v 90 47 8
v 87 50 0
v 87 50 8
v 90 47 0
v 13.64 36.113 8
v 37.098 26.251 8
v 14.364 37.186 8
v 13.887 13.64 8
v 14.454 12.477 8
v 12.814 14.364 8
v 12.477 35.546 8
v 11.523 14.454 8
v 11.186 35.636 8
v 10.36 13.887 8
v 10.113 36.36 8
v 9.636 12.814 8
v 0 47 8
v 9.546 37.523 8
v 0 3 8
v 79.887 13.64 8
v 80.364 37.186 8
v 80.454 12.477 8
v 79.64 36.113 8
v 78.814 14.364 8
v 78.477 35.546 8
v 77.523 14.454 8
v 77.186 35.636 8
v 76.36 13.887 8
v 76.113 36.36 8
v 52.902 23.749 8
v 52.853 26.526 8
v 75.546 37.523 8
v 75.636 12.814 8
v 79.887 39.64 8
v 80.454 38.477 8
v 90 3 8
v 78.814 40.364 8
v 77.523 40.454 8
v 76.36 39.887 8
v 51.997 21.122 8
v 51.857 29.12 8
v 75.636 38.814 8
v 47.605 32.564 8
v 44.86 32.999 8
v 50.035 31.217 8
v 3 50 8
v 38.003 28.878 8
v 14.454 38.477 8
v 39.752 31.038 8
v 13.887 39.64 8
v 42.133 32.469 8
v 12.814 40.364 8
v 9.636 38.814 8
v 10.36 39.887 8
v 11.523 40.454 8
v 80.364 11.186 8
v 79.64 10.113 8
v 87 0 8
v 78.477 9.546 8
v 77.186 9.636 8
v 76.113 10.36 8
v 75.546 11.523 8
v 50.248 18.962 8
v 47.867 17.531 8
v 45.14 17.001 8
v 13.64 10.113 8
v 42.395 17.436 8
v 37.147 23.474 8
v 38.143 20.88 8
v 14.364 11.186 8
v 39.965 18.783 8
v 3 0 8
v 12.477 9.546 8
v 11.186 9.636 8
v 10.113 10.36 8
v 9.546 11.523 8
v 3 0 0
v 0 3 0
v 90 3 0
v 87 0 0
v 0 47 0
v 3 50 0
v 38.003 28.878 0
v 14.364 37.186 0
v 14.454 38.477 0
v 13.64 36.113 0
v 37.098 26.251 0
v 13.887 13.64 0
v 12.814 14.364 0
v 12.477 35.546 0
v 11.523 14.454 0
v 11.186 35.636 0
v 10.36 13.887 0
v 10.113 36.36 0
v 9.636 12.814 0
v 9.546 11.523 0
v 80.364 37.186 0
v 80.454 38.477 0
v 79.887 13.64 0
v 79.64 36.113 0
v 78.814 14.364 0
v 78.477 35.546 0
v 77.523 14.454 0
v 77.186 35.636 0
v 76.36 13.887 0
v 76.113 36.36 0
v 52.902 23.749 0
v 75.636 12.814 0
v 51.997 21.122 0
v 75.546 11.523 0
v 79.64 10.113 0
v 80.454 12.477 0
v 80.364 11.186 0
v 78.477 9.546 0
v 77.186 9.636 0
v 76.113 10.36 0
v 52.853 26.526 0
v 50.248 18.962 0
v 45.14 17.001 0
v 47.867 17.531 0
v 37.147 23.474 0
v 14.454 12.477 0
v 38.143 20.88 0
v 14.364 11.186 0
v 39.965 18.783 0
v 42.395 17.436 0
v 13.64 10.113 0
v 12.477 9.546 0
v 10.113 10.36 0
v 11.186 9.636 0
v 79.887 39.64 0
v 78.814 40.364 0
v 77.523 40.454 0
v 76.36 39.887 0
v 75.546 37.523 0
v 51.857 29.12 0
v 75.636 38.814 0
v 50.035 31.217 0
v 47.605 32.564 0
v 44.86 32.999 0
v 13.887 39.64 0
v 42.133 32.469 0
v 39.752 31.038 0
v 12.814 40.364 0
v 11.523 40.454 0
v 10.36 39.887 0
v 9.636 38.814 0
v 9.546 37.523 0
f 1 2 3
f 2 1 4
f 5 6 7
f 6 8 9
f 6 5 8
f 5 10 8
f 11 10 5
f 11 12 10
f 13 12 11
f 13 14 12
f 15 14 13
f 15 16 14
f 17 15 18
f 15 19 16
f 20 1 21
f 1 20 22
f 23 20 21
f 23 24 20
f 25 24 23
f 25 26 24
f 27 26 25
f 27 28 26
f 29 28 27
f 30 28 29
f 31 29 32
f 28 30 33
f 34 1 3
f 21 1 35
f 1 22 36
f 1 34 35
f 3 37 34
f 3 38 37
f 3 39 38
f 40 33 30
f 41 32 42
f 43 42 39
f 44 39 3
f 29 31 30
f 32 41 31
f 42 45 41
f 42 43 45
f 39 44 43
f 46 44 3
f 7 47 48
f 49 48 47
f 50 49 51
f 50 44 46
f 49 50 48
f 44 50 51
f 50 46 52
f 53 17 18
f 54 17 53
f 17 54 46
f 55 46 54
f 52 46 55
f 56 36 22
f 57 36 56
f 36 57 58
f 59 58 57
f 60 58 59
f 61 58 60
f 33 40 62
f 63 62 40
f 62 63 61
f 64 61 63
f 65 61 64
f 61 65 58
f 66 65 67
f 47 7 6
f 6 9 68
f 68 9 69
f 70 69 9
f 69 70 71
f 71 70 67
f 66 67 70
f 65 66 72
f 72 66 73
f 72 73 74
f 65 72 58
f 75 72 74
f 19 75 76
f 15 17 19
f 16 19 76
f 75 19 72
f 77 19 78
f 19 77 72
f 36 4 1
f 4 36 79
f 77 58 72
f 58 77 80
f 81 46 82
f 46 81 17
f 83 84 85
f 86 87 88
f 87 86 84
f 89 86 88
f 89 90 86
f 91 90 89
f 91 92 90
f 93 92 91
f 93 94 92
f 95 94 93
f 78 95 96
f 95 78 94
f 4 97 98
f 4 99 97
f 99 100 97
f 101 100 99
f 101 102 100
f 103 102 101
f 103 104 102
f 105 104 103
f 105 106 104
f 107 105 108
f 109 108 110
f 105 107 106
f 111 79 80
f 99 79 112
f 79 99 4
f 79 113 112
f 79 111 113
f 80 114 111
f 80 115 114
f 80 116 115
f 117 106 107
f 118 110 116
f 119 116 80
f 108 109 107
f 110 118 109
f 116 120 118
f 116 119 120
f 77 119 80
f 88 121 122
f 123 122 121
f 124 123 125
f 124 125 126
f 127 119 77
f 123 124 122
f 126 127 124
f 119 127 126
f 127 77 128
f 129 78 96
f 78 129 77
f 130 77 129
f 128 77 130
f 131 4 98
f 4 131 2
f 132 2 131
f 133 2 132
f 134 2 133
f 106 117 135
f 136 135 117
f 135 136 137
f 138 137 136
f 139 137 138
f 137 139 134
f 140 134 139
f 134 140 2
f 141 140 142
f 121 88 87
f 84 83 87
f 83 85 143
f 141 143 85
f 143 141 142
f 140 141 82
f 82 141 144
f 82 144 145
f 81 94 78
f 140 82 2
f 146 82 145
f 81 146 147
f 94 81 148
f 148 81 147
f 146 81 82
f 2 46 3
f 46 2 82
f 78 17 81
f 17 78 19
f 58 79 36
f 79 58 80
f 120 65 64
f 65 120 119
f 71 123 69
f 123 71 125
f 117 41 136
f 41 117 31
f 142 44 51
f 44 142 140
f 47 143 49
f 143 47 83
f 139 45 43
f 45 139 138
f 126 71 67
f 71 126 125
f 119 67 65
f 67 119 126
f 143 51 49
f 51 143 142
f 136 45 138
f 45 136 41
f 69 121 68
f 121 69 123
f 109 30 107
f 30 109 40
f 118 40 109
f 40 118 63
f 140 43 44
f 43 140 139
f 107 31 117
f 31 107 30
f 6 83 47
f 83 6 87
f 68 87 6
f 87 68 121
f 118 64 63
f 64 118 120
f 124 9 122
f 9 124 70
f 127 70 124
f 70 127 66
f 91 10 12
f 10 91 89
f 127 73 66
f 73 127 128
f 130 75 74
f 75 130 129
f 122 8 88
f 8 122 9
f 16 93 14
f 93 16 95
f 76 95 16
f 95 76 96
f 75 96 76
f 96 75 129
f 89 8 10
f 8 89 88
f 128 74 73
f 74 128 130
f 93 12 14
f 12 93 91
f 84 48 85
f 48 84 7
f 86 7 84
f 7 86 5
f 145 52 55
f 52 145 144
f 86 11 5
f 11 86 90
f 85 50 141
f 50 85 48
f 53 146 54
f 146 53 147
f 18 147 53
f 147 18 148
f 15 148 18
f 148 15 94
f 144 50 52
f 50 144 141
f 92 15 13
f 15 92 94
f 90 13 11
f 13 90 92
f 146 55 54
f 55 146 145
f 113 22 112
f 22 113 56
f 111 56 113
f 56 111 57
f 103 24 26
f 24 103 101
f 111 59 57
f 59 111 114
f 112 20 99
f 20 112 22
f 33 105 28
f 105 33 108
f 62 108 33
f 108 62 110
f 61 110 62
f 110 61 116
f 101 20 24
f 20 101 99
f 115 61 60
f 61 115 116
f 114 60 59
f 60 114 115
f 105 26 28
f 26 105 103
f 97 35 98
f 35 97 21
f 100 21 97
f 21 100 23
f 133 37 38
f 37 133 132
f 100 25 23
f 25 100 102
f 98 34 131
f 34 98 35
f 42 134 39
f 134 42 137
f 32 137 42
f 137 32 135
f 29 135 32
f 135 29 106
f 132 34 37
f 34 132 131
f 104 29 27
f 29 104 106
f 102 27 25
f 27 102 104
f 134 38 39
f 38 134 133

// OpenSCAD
$fn = 32;

// ----------------------------------------------------------------------
// Spacer plate: rect 90 x 50
// ----------------------------------------------------------------------

// --- parameters (mm) ---
bore_r = 8;               // centre bore radius
bolt_r = 2.5;             // bolt hole radius
plate_t = 8;              // plate thickness, Z (extrusion height)
plate_l = 90;             // plate length, X
plate_w = 50;             // plate width, Y
inset = 12;               // corner hole inset

profile = [[3, 0], [87, 0], [90, 3], [90, 47], [87, 50], [3, 50], [0, 47], [0, 3]];  // primary outline, 8 points, counter clockwise
void_1 = [[52.853, 26.526], [51.857, 29.12], [50.035, 31.217], [47.605, 32.564], [44.86, 32.999], [42.133, 32.469], [39.752, 31.038], [38.003, 28.878], [37.098, 26.251], [37.147, 23.474], [38.143, 20.88], [39.965, 18.783], [42.395, 17.436], [45.14, 17.001], [47.867, 17.531], [50.248, 18.962], [51.997, 21.122], [52.902, 23.749]];  // centre bore, 18 points
void_2 = [[14.454, 12.477], [13.887, 13.64], [12.814, 14.364], [11.523, 14.454], [10.36, 13.887], [9.636, 12.814], [9.546, 11.523], [10.113, 10.36], [11.186, 9.636], [12.477, 9.546], [13.64, 10.113], [14.364, 11.186]];  // corner hole, 12 points
void_3 = [[14.454, 38.477], [13.887, 39.64], [12.814, 40.364], [11.523, 40.454], [10.36, 39.887], [9.636, 38.814], [9.546, 37.523], [10.113, 36.36], [11.186, 35.636], [12.477, 35.546], [13.64, 36.113], [14.364, 37.186]];  // corner hole, 12 points
void_4 = [[80.454, 12.477], [79.887, 13.64], [78.814, 14.364], [77.523, 14.454], [76.36, 13.887], [75.636, 12.814], [75.546, 11.523], [76.113, 10.36], [77.186, 9.636], [78.477, 9.546], [79.64, 10.113], [80.364, 11.186]];  // corner hole, 12 points
void_5 = [[80.454, 38.477], [79.887, 39.64], [78.814, 40.364], [77.523, 40.454], [76.36, 39.887], [75.636, 38.814], [75.546, 37.523], [76.113, 36.36], [77.186, 35.636], [78.477, 35.546], [79.64, 36.113], [80.364, 37.186]];  // corner hole, 12 points

// --- the one profile operation ---
difference() {
  linear_extrude(height = plate_t) polygon(points = profile);
  translate([0, 0, -1])
    linear_extrude(height = plate_t + 2) polygon(points = void_1);
  translate([0, 0, -1])
    linear_extrude(height = plate_t + 2) polygon(points = void_2);
  translate([0, 0, -1])
    linear_extrude(height = plate_t + 2) polygon(points = void_3);
  translate([0, 0, -1])
    linear_extrude(height = plate_t + 2) polygon(points = void_4);
  translate([0, 0, -1])
    linear_extrude(height = plate_t + 2) polygon(points = void_5);
}
